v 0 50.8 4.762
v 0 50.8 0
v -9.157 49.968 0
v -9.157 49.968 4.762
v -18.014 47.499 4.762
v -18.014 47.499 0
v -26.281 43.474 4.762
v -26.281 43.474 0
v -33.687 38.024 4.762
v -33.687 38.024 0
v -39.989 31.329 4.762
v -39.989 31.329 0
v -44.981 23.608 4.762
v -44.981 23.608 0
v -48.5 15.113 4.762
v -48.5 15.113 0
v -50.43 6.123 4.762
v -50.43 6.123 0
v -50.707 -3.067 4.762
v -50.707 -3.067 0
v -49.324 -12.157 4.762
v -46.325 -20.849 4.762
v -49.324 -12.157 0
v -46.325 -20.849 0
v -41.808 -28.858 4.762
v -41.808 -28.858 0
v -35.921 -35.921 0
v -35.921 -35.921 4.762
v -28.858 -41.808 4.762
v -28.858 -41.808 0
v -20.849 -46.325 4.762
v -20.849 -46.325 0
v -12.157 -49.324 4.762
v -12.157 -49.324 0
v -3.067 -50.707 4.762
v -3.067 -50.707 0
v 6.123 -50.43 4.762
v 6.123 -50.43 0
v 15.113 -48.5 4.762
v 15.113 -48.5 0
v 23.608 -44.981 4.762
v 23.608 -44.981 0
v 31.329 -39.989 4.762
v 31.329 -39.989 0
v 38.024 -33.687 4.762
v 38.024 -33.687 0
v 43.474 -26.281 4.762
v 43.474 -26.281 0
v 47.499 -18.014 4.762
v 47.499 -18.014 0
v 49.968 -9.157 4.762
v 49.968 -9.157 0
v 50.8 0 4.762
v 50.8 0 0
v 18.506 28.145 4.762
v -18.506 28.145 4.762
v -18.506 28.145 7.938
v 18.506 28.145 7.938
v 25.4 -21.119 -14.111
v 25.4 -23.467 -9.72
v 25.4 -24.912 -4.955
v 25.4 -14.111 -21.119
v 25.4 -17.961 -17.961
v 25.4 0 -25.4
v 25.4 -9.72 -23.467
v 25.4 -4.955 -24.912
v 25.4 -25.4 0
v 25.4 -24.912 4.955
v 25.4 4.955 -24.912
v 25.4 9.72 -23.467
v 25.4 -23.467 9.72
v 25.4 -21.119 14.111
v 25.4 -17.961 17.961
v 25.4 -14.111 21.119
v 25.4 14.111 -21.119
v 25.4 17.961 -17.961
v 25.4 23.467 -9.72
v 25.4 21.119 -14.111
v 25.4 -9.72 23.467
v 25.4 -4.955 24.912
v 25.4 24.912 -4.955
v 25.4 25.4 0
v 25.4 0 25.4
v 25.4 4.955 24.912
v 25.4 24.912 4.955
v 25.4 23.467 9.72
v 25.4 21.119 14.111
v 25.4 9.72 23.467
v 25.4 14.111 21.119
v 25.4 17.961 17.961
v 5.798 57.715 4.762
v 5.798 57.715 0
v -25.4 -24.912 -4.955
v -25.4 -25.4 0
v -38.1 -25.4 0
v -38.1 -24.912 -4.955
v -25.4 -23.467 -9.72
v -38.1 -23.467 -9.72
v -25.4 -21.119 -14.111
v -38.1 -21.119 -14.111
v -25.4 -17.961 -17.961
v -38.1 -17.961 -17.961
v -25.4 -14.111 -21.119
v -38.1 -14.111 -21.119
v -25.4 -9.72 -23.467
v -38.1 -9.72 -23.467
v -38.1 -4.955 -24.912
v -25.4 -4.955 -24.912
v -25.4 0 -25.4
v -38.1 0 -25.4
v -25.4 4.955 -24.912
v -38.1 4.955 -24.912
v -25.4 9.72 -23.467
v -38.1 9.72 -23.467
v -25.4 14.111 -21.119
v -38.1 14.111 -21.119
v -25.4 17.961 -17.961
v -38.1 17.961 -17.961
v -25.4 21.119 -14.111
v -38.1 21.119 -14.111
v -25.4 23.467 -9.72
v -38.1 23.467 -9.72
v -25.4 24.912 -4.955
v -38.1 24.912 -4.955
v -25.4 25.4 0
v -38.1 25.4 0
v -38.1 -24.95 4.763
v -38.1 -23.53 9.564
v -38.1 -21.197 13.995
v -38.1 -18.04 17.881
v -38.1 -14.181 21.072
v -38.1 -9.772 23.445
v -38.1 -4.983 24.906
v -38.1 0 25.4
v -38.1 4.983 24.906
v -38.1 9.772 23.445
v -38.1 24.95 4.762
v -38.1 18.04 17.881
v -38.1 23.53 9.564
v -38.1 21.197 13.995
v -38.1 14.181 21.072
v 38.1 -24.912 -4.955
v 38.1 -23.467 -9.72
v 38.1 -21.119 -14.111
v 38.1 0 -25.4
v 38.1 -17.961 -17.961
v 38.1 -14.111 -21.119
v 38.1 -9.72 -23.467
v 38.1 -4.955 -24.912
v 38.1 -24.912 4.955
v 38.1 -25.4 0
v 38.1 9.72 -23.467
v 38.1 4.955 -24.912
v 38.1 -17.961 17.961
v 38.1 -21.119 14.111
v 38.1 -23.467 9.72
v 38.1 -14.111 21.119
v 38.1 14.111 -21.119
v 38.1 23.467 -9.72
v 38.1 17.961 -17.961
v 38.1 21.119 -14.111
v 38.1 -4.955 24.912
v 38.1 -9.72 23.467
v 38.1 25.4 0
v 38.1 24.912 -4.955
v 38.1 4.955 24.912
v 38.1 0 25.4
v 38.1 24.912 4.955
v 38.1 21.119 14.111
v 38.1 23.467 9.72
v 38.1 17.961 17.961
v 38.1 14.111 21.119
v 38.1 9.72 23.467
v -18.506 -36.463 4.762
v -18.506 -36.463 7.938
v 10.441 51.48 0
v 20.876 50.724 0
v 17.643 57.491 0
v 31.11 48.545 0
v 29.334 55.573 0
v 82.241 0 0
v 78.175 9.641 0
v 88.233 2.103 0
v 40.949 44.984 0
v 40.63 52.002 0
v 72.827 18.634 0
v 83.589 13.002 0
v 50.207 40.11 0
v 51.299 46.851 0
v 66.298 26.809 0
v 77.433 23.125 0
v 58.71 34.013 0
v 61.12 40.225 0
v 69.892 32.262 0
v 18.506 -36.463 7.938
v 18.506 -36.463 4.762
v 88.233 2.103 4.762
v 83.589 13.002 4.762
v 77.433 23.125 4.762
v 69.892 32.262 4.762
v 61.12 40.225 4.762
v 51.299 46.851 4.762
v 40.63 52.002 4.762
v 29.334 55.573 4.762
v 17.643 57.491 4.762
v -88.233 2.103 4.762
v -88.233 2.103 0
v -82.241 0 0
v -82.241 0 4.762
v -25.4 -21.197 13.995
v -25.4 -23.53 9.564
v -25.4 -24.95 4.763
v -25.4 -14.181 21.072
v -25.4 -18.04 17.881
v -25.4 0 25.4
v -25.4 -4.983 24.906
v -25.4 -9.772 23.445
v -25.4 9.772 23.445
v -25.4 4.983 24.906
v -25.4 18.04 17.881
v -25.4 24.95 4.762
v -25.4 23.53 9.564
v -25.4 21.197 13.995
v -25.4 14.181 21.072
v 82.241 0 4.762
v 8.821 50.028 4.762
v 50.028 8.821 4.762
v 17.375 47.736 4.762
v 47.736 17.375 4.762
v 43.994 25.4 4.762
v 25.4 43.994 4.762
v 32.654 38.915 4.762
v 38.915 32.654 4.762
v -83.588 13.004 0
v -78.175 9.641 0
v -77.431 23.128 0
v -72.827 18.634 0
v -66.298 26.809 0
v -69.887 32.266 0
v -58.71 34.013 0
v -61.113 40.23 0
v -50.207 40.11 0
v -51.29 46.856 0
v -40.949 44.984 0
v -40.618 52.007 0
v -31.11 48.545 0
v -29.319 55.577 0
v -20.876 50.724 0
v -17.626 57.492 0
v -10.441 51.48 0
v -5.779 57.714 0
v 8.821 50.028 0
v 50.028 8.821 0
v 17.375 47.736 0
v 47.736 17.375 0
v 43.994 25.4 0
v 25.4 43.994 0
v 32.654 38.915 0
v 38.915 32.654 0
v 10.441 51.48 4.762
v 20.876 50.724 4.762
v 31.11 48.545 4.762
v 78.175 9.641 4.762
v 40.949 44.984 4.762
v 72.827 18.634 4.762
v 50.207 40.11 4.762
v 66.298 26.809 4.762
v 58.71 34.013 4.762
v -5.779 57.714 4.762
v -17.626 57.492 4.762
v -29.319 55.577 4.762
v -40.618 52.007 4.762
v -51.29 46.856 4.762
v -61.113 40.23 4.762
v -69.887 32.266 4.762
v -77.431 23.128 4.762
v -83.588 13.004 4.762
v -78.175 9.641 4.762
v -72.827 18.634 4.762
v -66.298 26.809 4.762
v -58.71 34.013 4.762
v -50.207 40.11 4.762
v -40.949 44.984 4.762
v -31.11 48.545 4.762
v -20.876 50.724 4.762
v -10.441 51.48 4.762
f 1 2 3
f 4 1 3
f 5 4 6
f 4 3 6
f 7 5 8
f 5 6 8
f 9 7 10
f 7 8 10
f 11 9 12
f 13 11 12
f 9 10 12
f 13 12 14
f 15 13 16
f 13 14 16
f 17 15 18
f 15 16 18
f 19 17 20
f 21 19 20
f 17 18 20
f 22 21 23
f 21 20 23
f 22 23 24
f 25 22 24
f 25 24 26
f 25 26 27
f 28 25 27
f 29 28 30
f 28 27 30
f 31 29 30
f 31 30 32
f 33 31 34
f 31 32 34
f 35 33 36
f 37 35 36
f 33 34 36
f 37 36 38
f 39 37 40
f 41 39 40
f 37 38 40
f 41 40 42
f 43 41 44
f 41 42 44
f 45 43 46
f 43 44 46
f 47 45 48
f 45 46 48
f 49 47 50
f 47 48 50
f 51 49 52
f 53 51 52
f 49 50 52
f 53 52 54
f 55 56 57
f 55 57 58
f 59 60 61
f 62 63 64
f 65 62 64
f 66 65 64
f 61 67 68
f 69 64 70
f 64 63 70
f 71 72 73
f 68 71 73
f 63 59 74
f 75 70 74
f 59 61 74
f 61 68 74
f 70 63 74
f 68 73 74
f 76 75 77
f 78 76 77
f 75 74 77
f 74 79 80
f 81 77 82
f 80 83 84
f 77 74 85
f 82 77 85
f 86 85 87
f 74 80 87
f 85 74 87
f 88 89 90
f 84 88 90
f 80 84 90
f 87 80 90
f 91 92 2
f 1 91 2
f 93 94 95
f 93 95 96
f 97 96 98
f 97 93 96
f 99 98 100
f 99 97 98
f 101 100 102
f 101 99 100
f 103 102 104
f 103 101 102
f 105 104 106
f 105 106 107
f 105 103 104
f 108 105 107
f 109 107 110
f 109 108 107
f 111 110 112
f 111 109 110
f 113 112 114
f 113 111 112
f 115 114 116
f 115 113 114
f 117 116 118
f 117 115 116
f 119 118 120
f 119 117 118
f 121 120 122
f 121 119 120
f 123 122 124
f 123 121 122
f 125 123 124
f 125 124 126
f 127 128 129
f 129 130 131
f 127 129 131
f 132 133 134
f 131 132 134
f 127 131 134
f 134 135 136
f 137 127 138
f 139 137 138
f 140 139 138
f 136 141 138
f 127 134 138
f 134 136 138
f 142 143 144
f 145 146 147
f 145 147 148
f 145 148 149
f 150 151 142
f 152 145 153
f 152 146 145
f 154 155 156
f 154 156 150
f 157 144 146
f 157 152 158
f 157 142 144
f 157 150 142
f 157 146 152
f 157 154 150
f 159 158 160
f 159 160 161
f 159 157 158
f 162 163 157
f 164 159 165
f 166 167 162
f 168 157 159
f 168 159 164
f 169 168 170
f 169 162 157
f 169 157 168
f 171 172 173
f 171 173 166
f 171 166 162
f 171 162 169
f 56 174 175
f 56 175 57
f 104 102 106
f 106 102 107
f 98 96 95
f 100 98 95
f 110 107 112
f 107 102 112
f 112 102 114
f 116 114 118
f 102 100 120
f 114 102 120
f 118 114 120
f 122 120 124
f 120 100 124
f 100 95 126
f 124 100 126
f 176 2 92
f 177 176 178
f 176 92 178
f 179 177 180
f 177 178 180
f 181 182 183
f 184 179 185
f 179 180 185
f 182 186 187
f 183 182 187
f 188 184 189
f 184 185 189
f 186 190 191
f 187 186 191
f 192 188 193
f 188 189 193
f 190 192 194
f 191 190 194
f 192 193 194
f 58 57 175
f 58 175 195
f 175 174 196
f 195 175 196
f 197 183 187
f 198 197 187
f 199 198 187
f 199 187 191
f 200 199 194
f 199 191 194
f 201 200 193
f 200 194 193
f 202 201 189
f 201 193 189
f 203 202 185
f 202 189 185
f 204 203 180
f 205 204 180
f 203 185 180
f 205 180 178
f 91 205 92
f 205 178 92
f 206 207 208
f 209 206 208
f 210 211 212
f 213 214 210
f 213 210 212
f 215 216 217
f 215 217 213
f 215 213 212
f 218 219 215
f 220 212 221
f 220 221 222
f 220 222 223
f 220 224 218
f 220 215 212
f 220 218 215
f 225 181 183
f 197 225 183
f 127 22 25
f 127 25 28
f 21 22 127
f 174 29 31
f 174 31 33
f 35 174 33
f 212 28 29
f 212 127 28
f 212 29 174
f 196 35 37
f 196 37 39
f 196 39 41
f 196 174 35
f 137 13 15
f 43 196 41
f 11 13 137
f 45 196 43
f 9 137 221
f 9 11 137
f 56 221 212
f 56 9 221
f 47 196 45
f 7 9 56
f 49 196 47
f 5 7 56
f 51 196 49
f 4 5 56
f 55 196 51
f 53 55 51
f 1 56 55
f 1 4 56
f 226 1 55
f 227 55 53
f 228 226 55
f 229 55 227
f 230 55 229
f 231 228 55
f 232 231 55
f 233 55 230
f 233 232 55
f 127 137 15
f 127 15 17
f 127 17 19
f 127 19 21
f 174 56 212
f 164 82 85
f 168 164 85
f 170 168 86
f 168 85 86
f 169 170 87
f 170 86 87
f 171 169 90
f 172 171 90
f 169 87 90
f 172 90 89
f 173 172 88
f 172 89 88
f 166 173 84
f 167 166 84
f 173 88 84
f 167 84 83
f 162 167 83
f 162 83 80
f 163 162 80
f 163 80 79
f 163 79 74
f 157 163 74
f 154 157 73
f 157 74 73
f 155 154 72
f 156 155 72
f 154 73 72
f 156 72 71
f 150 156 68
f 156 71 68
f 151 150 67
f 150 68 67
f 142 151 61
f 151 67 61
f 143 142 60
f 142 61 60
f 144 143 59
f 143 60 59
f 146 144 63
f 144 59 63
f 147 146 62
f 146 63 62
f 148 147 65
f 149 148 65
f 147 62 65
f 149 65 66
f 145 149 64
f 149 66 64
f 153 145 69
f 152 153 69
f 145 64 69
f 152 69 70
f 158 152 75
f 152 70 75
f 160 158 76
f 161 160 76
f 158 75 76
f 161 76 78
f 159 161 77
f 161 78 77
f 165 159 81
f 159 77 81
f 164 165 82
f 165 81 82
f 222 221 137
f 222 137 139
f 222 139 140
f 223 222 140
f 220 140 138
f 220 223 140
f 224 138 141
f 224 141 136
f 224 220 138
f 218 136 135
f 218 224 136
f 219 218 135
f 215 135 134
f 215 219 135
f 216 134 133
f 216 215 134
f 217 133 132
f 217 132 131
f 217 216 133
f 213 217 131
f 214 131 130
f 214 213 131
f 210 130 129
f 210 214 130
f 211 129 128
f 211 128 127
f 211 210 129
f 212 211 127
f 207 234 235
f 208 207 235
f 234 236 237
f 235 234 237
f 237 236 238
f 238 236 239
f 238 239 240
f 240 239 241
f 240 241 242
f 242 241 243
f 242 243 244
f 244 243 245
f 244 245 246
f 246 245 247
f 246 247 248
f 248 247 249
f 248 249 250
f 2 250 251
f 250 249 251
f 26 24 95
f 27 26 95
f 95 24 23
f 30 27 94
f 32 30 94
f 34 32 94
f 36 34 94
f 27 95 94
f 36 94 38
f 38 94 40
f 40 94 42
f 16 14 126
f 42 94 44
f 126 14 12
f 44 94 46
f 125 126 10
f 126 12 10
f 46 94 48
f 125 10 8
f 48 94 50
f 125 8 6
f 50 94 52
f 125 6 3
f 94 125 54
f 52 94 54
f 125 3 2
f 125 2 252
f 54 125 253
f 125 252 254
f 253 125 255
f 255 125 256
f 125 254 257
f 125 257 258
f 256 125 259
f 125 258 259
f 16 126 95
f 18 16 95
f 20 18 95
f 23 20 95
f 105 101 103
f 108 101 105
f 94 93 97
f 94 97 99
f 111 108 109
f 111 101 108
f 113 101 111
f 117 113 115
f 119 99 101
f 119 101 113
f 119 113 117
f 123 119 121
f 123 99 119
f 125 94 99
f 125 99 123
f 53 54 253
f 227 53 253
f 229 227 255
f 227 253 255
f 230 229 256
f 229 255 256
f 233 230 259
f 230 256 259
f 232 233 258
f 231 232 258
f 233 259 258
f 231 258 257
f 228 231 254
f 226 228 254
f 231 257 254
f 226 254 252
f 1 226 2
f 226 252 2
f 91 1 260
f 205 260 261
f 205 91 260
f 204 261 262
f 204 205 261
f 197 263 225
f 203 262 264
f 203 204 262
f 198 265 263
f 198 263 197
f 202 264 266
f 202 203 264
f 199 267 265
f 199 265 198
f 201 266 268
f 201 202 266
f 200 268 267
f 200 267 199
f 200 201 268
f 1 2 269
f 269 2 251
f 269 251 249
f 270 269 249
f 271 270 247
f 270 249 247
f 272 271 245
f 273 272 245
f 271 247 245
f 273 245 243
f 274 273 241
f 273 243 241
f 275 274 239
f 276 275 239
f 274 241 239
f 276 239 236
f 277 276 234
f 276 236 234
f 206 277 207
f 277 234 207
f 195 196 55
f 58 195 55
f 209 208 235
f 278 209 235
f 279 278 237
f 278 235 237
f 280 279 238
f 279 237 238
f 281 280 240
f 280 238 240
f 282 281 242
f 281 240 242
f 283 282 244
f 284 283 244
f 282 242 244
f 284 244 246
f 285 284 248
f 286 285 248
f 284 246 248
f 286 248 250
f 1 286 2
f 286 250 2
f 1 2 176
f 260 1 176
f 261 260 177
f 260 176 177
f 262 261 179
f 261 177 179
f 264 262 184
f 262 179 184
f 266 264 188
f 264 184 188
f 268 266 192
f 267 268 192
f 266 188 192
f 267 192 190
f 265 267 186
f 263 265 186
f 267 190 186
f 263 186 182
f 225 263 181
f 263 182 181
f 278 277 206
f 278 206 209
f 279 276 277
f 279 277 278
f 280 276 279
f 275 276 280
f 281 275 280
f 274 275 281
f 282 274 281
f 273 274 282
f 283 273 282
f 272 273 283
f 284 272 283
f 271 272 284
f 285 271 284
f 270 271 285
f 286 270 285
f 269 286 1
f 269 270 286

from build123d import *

# Parameters (mm, degrees)
F1_DEPTH = 4.7625
F3_R     = 25.4
F4_DEPTH = 12.7
F6_R     = 25.4
F7_DEPTH = 12.7
F8_W     = 37.011206
F8_H     = 64.607995
F9_DEPTH = 3.175


with BuildPart() as f1:
    # F0 (on Top) → F1 (new body)
    with BuildSketch(Plane.XY):
        with BuildLine():
            ThreePointArc((0, 50.8), (-35.921024, -35.921024), (50.8, 0))
            ThreePointArc((50.8, 0), (35.921024, 35.921024), (0, 50.8))
        make_face()
        with BuildLine():
            ThreePointArc((-82.240959, 0), (-50.206793, 40.109982), (0, 50.8))
            Line((0, 50.8), (-5.778502, 57.714164))
            ThreePointArc((-5.778502, 57.714164), (-56.320491, 43.719545), (-88.232808, 2.10289))
            Line((-88.232808, 2.10289), (-82.240959, 0))
        make_face()
        with BuildLine():
            Line((5.797567, 57.715176), (0, 50.8))
            ThreePointArc((0, 50.8), (50.206793, 40.109982), (82.240959, 0))
            Line((82.240959, 0), (88.232808, 2.10289))
            ThreePointArc((88.232808, 2.10289), (56.328405, 43.714207), (5.797567, 57.715176))
        make_face()
    extrude(amount=F1_DEPTH)

    # F6 (on offset) → F7 (join)
    with BuildSketch(Plane.YZ.offset(-25.4)):
        Circle(F6_R)
    extrude(amount=-F7_DEPTH)

    # F8 (on face) → F9 (join)
    with BuildSketch(Plane.XY.offset(4.7625)):
        with Locations((0, -4.158877)):
            Rectangle(F8_W, F8_H)
    extrude(amount=F9_DEPTH)


with BuildPart() as f4:
    # F3 (on offset) → F4 (new body)
    with BuildSketch(Plane.YZ.offset(25.4)):
        Circle(F3_R)
    extrude(amount=F4_DEPTH)


solid = Compound([f1.part, f4.part])
